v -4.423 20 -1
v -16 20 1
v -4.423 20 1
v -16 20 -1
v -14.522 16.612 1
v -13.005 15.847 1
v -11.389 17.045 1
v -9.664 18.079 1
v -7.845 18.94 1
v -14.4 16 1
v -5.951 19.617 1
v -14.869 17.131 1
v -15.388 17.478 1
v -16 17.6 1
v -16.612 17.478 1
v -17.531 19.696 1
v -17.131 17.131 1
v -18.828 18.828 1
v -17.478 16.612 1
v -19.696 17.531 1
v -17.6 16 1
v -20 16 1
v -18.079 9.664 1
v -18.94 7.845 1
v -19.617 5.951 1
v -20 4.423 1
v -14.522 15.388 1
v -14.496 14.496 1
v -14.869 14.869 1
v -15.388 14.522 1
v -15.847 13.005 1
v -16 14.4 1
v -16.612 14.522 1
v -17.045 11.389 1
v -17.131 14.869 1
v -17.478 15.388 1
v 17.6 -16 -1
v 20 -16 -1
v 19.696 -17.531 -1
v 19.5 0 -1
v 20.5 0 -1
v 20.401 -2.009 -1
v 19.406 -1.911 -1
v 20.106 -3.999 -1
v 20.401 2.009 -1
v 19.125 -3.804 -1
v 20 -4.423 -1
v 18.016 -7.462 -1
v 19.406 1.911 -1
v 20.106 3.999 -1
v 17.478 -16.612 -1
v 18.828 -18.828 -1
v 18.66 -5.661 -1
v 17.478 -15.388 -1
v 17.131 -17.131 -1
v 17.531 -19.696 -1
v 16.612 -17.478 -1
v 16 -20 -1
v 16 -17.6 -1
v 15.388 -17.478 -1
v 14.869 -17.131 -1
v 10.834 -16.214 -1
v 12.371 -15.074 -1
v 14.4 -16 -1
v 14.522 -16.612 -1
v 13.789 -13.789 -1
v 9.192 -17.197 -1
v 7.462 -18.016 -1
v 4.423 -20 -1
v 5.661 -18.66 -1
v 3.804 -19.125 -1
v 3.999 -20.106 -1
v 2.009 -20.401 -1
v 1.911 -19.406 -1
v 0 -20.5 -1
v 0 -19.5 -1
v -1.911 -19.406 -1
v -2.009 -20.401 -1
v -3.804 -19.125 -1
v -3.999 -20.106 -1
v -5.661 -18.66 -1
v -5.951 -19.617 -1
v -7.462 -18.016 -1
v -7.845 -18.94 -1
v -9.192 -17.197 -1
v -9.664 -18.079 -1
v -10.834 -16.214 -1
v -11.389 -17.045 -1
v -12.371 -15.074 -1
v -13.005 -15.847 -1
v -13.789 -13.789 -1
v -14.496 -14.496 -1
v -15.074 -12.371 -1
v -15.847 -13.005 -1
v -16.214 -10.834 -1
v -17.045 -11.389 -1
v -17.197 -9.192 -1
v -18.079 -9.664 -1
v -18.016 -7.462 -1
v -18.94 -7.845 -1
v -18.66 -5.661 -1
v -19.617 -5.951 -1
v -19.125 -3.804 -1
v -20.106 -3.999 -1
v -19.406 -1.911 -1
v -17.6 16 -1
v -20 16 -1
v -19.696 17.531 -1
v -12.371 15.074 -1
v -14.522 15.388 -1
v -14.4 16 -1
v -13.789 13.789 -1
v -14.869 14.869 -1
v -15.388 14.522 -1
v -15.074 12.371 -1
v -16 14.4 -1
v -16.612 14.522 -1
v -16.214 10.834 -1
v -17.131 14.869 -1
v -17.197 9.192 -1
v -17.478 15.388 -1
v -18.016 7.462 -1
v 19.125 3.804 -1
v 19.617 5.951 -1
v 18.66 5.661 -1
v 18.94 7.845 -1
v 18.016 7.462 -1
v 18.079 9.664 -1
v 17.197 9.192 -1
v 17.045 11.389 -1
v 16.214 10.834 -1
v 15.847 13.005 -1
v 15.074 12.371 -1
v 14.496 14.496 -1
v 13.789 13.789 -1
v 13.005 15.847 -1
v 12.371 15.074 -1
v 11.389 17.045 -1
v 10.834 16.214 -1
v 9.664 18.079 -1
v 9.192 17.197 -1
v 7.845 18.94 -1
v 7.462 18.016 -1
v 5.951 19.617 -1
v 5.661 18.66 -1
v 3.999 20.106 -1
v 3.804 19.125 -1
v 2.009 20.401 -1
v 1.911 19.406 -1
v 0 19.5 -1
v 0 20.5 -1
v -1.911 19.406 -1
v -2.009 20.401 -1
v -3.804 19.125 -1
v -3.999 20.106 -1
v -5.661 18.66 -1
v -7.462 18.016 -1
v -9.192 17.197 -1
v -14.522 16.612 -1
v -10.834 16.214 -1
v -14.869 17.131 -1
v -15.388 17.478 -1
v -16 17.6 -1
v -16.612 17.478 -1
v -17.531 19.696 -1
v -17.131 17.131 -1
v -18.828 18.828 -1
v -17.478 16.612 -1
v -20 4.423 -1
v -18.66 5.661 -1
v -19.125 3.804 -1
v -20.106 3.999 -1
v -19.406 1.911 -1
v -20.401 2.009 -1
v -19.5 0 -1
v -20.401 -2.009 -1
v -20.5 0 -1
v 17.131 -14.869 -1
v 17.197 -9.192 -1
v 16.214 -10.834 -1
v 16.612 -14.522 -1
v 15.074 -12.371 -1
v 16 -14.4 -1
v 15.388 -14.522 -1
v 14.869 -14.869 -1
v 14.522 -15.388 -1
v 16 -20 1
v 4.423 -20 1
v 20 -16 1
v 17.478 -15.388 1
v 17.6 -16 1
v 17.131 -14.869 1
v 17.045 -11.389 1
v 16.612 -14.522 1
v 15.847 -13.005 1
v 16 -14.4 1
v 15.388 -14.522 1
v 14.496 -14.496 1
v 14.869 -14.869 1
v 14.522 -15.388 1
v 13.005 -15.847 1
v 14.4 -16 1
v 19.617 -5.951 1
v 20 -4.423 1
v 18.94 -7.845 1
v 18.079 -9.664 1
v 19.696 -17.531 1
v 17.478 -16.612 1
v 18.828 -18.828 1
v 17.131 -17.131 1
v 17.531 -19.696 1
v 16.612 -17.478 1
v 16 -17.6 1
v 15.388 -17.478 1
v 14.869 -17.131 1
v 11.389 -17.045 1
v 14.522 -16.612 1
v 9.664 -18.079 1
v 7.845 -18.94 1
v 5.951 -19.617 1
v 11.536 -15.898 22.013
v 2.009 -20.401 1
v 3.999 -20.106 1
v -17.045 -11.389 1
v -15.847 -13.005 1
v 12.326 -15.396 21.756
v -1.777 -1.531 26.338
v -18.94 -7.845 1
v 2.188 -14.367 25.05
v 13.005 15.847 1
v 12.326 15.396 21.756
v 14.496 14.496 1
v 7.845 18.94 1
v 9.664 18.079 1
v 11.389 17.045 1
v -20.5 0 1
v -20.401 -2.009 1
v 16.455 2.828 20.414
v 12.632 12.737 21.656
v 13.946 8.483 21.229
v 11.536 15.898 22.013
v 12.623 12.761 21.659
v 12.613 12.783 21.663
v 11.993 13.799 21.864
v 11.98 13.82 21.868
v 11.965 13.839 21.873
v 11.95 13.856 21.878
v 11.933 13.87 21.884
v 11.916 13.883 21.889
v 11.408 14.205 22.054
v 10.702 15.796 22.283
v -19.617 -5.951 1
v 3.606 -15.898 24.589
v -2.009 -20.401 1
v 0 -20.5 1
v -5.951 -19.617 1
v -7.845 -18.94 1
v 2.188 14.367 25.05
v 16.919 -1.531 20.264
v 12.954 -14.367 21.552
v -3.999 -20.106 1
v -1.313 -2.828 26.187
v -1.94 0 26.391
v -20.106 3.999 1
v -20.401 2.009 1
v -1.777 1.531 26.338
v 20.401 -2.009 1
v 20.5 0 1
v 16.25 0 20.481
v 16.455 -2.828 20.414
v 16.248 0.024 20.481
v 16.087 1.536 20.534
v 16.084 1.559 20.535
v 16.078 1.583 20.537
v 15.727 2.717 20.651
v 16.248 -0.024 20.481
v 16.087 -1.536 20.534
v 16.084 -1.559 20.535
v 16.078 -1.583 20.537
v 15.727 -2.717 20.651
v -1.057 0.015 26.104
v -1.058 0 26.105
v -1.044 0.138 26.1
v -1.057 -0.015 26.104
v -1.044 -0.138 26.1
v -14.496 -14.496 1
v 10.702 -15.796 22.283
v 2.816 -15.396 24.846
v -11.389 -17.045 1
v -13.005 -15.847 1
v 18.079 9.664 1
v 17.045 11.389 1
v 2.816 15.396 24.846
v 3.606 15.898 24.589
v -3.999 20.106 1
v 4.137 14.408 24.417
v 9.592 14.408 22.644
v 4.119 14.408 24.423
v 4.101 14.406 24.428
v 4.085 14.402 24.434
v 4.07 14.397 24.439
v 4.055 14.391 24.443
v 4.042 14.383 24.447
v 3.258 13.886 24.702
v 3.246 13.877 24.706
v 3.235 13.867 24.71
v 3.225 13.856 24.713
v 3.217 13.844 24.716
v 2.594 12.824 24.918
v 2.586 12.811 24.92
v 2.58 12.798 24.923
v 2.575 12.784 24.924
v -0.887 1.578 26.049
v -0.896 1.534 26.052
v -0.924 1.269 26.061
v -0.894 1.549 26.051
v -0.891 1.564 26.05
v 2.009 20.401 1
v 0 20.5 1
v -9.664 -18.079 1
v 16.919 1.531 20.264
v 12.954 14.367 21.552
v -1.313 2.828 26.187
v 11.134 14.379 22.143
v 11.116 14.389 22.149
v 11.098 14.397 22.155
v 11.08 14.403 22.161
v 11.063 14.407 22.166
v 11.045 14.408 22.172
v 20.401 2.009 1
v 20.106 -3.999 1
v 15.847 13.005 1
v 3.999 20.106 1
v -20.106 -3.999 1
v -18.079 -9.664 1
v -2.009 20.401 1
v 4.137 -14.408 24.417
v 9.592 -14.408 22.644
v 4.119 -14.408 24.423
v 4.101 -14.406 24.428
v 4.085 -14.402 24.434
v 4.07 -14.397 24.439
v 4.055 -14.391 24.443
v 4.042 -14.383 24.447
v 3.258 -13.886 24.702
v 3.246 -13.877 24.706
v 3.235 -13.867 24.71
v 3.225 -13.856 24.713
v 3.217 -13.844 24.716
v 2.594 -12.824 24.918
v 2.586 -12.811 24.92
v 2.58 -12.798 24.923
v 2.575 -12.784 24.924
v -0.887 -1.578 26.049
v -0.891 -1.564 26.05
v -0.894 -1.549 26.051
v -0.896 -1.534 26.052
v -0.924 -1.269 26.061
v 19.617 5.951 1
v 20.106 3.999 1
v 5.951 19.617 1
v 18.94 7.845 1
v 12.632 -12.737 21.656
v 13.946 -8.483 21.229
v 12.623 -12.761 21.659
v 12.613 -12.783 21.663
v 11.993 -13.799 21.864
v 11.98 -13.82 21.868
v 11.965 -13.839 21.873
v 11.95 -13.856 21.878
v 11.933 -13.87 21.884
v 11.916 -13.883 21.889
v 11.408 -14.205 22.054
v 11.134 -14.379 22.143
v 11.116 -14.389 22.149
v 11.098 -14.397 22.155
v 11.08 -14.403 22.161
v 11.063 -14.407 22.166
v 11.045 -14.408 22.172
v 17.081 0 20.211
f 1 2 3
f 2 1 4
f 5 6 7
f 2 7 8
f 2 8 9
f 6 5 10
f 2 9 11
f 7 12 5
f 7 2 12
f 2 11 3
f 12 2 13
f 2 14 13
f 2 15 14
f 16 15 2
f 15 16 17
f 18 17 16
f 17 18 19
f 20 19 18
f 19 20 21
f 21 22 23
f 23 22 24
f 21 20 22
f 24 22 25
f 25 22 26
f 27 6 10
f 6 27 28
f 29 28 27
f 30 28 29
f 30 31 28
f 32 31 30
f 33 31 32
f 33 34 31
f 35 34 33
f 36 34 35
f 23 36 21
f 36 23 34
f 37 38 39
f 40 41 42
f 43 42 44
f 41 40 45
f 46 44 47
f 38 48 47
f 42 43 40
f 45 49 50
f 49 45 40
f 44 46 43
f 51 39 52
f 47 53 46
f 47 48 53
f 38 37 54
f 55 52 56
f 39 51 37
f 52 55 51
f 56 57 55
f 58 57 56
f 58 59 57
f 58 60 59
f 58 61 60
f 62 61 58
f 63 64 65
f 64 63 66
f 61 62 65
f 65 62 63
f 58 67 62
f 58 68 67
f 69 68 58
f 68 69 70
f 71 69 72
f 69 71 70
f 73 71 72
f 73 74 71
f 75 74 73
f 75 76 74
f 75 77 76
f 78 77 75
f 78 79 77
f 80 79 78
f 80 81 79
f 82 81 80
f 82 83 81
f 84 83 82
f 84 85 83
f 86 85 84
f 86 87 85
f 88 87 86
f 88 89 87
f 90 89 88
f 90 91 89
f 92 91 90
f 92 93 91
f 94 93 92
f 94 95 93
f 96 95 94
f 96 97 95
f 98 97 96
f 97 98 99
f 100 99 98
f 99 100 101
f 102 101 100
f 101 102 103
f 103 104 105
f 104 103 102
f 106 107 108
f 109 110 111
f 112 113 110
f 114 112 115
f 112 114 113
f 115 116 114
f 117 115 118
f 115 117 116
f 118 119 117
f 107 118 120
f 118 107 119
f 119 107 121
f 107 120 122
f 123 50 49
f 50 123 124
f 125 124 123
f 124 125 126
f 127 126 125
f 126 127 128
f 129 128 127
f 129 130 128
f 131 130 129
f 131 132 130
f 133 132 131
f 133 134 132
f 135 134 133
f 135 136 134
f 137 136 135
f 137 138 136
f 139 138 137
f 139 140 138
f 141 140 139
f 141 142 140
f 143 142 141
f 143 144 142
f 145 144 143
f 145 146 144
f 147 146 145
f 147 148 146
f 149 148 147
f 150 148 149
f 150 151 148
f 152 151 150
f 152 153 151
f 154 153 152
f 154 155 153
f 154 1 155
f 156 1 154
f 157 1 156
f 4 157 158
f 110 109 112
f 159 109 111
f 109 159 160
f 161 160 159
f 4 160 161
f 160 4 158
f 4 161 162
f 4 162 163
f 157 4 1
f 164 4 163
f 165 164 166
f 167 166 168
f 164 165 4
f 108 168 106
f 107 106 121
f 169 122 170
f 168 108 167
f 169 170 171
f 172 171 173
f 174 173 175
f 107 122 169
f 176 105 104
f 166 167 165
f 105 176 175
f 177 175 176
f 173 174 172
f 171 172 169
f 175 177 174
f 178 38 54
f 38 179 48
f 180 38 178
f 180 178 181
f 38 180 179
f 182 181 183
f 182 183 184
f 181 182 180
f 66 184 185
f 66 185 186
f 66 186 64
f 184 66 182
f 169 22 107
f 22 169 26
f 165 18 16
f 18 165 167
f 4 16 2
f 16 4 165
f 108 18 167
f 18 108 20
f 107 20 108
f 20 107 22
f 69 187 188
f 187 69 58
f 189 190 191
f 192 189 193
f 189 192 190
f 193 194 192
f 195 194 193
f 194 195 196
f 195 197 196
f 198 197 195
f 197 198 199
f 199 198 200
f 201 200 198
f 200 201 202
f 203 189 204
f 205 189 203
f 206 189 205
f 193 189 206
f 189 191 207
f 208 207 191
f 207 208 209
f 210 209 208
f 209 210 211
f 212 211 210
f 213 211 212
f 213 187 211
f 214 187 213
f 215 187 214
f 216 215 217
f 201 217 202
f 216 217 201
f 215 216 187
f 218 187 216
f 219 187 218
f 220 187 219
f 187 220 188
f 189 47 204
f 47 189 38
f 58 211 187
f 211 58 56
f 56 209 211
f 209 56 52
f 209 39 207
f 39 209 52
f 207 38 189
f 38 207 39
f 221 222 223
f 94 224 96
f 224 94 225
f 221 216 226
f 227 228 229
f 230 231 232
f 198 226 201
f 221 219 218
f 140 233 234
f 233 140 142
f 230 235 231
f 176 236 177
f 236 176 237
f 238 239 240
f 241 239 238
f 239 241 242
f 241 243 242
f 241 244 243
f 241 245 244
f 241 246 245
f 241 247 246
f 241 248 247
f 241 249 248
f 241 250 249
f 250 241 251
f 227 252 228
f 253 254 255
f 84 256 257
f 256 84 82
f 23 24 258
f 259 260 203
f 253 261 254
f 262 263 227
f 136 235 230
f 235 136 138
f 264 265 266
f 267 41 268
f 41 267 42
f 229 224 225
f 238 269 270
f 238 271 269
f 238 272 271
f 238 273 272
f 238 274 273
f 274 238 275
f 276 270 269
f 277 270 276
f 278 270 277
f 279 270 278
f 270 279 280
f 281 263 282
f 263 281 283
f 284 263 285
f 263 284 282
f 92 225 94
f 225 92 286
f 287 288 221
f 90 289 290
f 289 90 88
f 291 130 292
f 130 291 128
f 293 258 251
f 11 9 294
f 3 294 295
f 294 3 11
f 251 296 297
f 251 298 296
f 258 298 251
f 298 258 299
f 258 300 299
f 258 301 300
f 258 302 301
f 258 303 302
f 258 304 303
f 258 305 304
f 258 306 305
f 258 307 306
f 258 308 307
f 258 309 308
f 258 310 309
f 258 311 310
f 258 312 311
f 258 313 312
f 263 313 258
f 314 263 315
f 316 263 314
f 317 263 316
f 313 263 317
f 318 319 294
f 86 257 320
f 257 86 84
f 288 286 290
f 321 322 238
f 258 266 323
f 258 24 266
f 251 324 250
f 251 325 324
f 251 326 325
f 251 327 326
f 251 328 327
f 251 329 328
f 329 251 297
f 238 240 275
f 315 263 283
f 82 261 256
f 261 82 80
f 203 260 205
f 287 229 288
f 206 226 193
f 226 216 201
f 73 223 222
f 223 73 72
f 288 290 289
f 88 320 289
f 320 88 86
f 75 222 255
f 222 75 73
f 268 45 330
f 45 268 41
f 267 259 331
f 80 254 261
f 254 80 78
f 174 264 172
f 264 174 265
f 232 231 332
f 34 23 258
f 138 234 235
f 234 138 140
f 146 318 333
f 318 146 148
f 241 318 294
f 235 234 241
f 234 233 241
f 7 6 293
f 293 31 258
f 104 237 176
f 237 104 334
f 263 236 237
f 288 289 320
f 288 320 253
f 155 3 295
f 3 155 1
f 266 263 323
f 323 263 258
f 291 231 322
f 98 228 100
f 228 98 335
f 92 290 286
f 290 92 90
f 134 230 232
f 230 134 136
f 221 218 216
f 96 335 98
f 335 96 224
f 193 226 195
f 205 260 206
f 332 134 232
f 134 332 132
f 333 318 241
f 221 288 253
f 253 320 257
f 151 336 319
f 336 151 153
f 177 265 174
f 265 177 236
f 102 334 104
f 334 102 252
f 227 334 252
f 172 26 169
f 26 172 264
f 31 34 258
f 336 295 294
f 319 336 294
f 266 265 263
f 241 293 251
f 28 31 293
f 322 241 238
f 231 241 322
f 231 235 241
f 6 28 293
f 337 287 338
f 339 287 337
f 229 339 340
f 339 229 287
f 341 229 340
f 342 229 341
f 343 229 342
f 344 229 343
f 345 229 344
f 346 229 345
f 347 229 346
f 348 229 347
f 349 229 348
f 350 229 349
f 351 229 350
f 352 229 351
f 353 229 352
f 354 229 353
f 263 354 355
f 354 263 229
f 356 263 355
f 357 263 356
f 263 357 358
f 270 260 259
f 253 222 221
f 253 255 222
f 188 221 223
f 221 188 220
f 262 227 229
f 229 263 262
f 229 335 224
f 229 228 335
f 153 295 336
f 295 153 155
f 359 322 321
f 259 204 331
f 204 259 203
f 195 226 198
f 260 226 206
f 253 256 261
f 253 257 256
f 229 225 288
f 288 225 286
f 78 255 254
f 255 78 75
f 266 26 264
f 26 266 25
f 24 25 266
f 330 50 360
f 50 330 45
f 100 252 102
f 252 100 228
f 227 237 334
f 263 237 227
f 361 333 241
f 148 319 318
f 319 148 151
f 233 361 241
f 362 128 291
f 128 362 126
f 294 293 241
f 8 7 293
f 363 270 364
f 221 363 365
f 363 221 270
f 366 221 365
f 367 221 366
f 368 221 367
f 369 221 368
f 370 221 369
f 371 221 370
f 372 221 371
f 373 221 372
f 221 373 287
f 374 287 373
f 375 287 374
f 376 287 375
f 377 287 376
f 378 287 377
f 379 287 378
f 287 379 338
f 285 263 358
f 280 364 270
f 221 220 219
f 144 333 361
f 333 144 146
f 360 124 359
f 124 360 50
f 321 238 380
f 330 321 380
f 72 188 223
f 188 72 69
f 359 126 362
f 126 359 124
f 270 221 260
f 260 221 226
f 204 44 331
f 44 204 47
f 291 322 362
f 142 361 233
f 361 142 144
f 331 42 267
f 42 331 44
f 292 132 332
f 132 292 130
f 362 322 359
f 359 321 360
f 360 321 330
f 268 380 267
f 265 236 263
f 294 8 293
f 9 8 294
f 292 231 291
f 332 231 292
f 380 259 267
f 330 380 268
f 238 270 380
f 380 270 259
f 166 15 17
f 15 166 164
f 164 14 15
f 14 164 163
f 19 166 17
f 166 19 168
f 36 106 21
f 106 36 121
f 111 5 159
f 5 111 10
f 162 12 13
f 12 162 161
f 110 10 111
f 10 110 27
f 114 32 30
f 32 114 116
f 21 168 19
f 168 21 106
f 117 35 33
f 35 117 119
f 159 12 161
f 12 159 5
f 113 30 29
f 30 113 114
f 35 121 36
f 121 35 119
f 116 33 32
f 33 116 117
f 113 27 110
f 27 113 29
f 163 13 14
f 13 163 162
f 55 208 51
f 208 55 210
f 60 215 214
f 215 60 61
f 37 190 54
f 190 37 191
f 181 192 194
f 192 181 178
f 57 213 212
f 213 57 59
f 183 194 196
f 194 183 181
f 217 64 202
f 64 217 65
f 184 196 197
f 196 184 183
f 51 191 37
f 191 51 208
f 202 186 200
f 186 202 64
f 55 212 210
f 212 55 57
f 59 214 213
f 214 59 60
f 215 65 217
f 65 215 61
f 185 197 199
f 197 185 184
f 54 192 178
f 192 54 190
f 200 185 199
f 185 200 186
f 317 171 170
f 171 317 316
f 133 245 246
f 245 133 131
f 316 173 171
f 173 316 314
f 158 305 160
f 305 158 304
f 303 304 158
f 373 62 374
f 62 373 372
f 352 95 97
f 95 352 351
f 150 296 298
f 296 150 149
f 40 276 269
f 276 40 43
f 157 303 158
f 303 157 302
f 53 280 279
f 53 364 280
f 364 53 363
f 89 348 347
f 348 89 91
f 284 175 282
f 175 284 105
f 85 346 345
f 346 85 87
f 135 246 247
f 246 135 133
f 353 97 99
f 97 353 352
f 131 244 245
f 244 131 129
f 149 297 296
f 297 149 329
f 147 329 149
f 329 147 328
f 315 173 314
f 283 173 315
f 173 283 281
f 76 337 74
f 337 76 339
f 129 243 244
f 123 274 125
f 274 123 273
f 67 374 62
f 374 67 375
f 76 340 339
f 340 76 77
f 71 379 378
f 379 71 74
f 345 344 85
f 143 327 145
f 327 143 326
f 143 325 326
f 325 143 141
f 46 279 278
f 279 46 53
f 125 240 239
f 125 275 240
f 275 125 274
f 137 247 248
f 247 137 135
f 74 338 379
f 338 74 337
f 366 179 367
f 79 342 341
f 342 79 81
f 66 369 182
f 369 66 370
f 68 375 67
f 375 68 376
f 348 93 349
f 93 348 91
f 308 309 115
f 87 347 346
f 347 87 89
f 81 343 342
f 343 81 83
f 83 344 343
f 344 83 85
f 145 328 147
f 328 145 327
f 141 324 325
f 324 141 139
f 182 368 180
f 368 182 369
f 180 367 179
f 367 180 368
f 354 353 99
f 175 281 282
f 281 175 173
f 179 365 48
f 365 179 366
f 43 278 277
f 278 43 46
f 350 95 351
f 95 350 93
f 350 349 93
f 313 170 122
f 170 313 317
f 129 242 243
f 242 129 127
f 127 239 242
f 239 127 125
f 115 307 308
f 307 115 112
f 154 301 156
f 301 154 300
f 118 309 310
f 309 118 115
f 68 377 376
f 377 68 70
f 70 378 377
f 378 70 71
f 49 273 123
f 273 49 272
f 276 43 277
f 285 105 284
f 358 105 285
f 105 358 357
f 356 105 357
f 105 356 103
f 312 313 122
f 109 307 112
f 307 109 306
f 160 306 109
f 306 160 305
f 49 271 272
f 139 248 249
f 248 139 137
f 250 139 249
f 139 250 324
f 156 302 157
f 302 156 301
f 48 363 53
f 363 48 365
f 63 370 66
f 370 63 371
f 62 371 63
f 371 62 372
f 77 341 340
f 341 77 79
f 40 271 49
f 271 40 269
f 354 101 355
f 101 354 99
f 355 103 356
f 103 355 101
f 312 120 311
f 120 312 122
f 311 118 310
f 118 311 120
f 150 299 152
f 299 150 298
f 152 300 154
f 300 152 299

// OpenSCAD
nozzle_edges = 6;
nozzle_edgeradius = 3;
nozzle_edgerotate = false;
nozzle_length = 24;
nozzle_dillation = 24;
nozzle_wall = 1;
nozzle_scale = 0.75;
nozzle_tilt = 18;

mntholes_numberof = 2;
mntholes_angles = [ 90, 270, 0, 180 ];

$fn = 64;

module nozzle_shape( r, h )
{
	if ( nozzle_edges < 20 && nozzle_edgeradius > 0 )
		for ( a = [0:nozzle_edges] )
			rotate( [ 0, 0, 360/nozzle_edges * a ] )
				translate( [ r- nozzle_edgeradius, 0, 0 ] )
					cylinder( r = nozzle_edgeradius, h = h, center = true, $fn = 16 );
	else
		cylinder( r = r, h = h, center = true, $fn = nozzle_edges );
}

difference()
{
	union()
	{
		for ( a = [1:mntholes_numberof] )
			rotate( [ 0, 0, mntholes_angles[a-1] ] )
			{
				translate( [ 10, 8, 0 ] )
					cube( [ 20, 16, 2 ], center = true );
				translate( [ 8, 10, 0 ] )
					cube( [ 16, 20, 2 ], center = true );
				translate( [ 16, 16, 0 ] )
					cylinder( r = 4, h = 2, center = true, $fn = 16 );
			}

		hull()
		{
			cylinder( r = 20.5, h = 2, center = true );
			rotate( [ 0, nozzle_tilt, 0 ] )
			translate( [ 0, 0, nozzle_length ] )
				scale( [ nozzle_scale, 1 / nozzle_scale, 1 ] )
					rotate( [ 0, 0, nozzle_edgerotate ? 180 / nozzle_edges : 0 ] )
						nozzle_shape( r = nozzle_dillation/2+nozzle_wall*max(nozzle_scale,1/nozzle_scale), h = 1 );
		}
	}

	for ( a = [1:mntholes_numberof] )
		rotate( [ 0, 0, mntholes_angles[a-1] ] )
			translate( [ 16, 16, 0 ] )
				cylinder( r = 1.6, h = 5, center = true, $fn = 16 );

	hull()
	{
		translate( [ 0, 0, -1.5 ] )
		cylinder( r = 20.5 - nozzle_wall, h = 1, center = true );
			rotate( [ 0, nozzle_tilt, 0 ] )
		translate( [ 0, 0, nozzle_length ] )
			//cylinder( r = nozzle_dillation * cos( 180 / nozzle_edges )/2, h = 1.5, center = true );
			scale( [ nozzle_scale, 1 / nozzle_scale, 1 ] )
				rotate( [ 0, 0, nozzle_edgerotate ? 180 / nozzle_edges : 0 ] )
					nozzle_shape( r = nozzle_dillation/2, h = 1.5 );
	}
}
